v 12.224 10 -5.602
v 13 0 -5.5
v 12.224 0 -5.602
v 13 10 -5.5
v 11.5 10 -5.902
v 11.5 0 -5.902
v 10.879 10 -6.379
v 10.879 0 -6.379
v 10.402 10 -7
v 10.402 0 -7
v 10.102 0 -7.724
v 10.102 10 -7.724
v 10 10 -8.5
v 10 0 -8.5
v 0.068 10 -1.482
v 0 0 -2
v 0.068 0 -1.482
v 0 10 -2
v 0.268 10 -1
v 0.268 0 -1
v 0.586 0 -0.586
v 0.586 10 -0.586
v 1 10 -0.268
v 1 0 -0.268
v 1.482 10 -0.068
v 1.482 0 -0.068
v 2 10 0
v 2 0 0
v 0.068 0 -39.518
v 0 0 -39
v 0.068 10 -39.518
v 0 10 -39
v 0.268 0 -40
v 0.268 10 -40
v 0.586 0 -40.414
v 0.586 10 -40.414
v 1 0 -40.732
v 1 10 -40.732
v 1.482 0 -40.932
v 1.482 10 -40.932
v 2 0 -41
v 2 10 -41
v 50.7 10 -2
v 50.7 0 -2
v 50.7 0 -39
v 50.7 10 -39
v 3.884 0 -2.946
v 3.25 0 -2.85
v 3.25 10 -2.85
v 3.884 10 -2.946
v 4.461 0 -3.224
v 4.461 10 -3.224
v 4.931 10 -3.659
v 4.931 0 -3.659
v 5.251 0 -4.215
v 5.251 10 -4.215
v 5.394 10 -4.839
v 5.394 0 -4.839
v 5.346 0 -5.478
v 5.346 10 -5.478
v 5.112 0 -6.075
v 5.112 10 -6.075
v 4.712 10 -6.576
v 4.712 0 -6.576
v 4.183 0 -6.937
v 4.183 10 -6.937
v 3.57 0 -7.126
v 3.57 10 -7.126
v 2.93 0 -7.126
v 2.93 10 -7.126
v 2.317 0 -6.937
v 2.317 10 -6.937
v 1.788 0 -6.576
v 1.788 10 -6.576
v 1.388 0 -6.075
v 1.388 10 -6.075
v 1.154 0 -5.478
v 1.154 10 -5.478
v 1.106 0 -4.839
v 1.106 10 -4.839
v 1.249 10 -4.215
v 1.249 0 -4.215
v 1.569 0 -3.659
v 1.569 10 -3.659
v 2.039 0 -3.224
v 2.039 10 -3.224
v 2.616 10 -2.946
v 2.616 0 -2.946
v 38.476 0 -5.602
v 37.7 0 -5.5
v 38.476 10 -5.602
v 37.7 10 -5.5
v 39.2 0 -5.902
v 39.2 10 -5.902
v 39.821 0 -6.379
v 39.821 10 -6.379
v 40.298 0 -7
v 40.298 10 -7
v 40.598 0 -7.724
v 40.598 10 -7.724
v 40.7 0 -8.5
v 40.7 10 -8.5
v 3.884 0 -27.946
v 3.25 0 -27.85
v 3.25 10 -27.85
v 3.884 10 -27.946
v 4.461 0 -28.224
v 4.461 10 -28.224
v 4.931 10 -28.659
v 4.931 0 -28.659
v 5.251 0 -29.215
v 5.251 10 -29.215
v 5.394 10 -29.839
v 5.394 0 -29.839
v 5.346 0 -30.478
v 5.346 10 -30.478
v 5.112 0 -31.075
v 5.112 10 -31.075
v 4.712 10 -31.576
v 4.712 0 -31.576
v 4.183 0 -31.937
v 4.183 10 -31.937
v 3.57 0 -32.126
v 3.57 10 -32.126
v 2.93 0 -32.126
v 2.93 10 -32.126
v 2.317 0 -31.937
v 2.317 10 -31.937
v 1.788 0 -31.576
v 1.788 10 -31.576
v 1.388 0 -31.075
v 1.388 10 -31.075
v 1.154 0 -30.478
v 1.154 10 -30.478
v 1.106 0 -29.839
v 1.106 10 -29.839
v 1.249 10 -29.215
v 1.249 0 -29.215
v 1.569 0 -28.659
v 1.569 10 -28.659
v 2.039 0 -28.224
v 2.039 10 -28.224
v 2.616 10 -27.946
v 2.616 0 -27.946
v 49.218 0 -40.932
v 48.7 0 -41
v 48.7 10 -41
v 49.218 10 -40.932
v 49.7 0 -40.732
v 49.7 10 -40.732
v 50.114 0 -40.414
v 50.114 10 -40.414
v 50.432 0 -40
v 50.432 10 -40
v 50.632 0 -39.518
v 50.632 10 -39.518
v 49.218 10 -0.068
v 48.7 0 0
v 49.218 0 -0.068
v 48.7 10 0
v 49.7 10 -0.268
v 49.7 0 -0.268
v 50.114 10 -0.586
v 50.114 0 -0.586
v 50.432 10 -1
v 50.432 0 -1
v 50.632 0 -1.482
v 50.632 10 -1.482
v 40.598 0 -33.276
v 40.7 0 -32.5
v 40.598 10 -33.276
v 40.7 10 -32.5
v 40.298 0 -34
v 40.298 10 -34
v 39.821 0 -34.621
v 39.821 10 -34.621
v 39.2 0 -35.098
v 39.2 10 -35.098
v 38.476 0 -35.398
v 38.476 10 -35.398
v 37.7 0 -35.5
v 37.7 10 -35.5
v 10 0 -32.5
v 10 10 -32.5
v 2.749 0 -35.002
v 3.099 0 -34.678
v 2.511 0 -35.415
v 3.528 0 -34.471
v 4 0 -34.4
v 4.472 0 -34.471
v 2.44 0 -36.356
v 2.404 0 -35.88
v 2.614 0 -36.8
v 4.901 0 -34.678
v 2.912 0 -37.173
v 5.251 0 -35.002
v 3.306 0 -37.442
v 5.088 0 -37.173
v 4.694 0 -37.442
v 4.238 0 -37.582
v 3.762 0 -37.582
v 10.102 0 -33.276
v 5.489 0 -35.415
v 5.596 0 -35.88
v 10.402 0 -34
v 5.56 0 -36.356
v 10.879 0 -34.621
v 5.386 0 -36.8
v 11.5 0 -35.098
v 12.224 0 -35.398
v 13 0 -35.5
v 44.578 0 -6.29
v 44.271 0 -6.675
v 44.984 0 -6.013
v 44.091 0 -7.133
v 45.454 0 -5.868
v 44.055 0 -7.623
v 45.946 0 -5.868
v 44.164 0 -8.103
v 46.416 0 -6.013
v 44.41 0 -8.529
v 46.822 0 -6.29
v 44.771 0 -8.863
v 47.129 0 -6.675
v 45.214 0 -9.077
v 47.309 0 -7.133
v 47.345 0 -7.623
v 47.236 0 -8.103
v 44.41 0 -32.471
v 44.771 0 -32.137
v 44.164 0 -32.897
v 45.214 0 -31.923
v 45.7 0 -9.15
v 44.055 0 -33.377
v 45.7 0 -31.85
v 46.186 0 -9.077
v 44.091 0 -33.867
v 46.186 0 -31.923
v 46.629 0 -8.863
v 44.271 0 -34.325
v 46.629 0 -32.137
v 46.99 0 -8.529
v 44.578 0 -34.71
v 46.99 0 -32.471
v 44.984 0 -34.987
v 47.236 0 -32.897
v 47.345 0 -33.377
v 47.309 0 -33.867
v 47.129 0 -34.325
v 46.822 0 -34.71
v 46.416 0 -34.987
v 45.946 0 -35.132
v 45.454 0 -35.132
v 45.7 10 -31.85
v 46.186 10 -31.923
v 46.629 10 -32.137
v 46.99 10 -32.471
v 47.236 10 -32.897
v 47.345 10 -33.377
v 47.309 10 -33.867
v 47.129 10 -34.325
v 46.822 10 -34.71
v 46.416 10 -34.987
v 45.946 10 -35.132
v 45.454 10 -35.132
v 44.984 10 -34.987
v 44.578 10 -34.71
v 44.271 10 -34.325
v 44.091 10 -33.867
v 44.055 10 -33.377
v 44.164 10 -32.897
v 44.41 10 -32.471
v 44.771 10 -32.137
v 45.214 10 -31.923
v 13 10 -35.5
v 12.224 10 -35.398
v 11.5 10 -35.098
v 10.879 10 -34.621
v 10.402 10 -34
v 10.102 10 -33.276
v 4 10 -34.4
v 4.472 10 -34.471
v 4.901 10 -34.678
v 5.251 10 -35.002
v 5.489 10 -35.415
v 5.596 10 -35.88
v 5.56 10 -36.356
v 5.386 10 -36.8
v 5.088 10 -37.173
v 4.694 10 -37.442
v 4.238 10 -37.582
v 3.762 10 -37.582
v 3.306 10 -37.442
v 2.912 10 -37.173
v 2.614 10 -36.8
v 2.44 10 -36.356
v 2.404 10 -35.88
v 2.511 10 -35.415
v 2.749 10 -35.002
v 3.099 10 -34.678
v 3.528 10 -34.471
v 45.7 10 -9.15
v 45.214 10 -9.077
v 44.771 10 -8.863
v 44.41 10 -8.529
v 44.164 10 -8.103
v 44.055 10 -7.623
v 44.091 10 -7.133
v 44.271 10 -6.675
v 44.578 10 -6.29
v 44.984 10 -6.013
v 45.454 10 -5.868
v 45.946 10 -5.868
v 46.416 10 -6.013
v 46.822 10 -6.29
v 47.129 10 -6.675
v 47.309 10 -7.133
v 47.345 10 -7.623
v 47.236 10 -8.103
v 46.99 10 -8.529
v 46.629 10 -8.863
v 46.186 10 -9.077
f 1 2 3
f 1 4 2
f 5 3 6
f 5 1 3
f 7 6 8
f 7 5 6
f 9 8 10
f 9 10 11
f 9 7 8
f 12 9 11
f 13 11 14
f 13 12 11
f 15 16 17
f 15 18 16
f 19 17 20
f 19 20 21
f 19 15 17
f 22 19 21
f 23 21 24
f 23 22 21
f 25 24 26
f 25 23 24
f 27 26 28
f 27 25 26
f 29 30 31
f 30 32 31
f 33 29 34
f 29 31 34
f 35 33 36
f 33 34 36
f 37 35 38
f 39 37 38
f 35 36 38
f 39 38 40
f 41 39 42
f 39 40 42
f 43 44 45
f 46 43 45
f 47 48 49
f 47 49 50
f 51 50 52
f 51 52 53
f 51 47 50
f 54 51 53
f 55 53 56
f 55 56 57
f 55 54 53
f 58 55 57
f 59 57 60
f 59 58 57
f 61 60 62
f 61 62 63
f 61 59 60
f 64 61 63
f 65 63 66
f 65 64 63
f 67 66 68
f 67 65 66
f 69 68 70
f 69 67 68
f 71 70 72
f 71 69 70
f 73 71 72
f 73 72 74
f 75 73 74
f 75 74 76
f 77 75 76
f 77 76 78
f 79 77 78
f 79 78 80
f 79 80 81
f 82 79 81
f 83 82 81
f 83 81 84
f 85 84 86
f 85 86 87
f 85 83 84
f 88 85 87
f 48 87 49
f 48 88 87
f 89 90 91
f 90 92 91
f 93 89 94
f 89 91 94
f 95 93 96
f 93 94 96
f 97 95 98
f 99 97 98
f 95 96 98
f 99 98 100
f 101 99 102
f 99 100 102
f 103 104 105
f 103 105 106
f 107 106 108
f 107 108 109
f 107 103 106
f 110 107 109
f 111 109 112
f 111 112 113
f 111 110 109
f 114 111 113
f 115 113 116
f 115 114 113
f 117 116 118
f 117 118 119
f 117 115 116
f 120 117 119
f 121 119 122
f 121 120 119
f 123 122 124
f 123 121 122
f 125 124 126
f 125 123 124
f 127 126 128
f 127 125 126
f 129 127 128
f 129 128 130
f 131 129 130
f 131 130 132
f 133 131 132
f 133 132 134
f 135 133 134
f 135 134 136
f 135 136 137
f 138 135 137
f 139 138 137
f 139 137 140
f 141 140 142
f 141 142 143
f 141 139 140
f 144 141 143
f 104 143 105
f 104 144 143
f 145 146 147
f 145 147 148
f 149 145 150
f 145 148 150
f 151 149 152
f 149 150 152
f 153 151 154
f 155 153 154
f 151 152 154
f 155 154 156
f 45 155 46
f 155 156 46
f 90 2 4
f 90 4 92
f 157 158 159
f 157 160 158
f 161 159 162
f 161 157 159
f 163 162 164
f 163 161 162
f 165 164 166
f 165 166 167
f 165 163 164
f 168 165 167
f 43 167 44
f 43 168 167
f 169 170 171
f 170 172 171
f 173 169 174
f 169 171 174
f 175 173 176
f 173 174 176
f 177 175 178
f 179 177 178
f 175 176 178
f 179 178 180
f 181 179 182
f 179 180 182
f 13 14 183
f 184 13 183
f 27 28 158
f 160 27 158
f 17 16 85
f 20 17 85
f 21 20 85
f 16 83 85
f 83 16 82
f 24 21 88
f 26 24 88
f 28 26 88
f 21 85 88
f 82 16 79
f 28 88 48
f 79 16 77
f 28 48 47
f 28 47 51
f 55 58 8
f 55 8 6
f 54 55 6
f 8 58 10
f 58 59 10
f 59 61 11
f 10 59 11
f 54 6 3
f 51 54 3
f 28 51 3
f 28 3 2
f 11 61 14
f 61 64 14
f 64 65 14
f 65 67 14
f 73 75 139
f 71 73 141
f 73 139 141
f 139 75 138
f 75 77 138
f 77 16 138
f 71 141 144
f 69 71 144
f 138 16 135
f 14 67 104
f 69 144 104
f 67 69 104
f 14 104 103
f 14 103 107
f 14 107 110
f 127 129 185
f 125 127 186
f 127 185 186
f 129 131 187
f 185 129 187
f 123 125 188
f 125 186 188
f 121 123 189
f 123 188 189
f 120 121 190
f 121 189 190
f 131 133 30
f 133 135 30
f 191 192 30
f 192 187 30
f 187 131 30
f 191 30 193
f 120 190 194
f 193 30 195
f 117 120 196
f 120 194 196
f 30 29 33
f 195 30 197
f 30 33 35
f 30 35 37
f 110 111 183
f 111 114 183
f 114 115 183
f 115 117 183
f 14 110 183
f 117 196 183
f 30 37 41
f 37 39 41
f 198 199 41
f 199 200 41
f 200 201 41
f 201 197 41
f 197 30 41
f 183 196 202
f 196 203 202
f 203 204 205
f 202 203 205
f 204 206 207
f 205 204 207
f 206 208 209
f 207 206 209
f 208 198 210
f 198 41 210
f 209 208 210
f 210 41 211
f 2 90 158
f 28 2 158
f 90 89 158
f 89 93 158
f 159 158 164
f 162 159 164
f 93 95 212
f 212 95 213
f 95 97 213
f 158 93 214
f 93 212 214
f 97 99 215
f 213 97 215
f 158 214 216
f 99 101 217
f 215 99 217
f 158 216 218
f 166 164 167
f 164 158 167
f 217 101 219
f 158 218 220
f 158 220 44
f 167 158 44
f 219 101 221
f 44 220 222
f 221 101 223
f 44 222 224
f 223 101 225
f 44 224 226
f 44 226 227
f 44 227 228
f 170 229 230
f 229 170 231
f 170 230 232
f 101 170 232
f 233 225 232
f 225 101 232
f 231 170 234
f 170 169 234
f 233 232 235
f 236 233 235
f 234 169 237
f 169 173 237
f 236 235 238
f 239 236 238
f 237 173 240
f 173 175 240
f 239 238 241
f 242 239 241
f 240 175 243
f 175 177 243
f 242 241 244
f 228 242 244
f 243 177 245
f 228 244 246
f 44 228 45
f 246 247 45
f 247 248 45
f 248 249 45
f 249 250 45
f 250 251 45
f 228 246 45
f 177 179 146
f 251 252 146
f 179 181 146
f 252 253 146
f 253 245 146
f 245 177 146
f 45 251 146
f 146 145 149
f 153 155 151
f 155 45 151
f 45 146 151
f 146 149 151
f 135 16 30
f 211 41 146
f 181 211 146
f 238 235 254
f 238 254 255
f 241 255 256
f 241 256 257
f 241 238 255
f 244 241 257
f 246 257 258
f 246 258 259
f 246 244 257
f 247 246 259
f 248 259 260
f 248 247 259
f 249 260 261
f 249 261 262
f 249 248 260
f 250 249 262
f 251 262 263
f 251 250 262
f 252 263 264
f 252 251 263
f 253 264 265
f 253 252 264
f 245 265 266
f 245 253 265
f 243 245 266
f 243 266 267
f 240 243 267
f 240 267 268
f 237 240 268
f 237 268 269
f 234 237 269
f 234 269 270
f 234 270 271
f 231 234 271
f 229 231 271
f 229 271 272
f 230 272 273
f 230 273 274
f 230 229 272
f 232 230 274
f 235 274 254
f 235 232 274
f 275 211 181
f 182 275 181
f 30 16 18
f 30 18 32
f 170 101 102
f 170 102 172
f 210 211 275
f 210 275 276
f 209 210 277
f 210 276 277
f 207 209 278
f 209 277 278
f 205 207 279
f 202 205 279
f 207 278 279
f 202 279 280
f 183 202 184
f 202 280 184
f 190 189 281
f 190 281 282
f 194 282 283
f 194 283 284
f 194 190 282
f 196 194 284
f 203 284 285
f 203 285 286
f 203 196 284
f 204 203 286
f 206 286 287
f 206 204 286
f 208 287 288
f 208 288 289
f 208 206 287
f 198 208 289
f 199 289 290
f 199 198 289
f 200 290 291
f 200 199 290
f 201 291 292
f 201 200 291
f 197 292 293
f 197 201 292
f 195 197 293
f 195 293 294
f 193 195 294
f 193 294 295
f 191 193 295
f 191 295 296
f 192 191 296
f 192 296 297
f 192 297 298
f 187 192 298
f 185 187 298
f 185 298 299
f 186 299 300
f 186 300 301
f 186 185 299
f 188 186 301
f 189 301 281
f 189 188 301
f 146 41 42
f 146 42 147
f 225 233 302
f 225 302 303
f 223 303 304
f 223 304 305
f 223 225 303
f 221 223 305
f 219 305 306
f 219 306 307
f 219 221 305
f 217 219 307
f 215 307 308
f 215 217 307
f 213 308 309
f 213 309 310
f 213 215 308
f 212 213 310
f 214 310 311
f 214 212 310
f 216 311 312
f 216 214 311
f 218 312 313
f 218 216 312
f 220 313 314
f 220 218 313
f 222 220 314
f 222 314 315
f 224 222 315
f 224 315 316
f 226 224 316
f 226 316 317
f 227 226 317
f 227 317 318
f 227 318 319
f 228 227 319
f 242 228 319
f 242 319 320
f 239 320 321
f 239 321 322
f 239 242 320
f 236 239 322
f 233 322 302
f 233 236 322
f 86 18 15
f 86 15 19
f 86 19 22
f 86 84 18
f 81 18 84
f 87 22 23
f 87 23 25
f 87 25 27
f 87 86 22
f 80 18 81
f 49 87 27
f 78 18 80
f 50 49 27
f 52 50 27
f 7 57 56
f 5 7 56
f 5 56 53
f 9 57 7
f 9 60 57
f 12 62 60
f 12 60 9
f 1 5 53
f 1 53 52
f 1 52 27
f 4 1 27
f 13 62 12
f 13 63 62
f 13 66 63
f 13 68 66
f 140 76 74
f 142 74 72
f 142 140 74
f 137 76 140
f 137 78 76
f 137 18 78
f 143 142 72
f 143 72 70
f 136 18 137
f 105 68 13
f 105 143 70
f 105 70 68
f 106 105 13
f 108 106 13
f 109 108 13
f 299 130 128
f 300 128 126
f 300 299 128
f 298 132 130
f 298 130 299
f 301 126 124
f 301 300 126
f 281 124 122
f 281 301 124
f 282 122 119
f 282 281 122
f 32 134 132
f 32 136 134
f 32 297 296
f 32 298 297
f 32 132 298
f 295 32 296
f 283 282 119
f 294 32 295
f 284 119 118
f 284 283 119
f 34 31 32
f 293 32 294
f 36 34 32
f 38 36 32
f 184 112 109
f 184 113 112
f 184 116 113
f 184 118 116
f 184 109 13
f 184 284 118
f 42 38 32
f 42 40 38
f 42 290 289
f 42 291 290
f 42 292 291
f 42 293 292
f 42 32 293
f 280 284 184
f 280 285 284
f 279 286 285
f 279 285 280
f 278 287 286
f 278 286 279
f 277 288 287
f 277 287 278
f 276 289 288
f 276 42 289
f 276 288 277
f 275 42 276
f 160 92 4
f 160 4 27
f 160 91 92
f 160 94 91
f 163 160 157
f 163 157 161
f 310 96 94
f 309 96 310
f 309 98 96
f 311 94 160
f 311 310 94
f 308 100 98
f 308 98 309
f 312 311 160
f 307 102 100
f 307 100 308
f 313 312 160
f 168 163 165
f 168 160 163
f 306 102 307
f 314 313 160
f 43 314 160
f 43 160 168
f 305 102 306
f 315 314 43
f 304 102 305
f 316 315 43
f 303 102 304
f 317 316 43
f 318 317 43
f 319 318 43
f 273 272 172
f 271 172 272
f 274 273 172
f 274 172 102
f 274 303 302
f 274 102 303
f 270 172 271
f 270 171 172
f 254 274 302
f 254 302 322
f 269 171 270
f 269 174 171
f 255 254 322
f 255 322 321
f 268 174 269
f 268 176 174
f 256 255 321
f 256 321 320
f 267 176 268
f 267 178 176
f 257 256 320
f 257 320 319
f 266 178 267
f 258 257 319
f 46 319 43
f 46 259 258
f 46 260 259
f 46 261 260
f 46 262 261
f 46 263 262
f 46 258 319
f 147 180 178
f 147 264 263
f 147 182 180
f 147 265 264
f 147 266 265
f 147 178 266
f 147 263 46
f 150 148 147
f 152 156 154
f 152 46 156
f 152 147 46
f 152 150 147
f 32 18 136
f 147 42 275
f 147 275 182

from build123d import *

# Parameters (mm, degrees)
SKETCH_2_W      = 50.7
SKETCH_2_H      = 41
SKETCH_2_R      = 1.6
SKETCH_2_R_2    = 2.15
SKETCH_2_R_3    = 1.65
SKETCH_2_W_2    = 30.7
SKETCH_2_H_2    = 30
EXTRUDE_1_DEPTH = 10
FILLET_1_R      = 2
FILLET_2_R      = 3


with BuildPart() as part:
    # ｽｹｯﾁ2 → ﾎﾞｽ - 押し出し1 (new body)
    with BuildSketch(Plane(origin=(0, 0, 0), x_dir=(1, 0, 0), z_dir=(0, 1, 0))):
        with Locations((25.35, 20.5)):
            Rectangle(SKETCH_2_W, SKETCH_2_H)
        with Locations(Location((4, 36, 0), (0, 0, 270))):
            Circle(SKETCH_2_R, mode=Mode.SUBTRACT)
        with Locations(Location((3.25, 30, 0), (0, 0, 270))):
            Circle(SKETCH_2_R_2, mode=Mode.SUBTRACT)
        with Locations(Location((3.25, 5, 0), (0, 0, 270))):
            Circle(SKETCH_2_R_2, mode=Mode.SUBTRACT)
        with Locations(Location((45.7, 33.5, 0), (0, 0, 270))):
            Circle(SKETCH_2_R_3, mode=Mode.SUBTRACT)
        with Locations(Location((45.7, 7.5, 0), (0, 0, 90))):
            Circle(SKETCH_2_R_3, mode=Mode.SUBTRACT)
        with Locations((25.35, 20.5)):
            Rectangle(SKETCH_2_W_2, SKETCH_2_H_2, mode=Mode.SUBTRACT)
    extrude(amount=EXTRUDE_1_DEPTH)

    # ﾌｨﾚｯﾄ1
    fillet_1_edges = [part.edges().sort_by_distance(p)[0] for p in [
        (0, 5, -41),
        (50.7, 5, -41),
        (50.7, 5, 0),
        (0, 5, 0),
    ]]
    fillet(fillet_1_edges, radius=FILLET_1_R)

    # ﾌｨﾚｯﾄ2
    fillet_2_edges = [part.edges().sort_by_distance(p)[0] for p in [
        (40.7, 5, -5.5),
        (40.7, 5, -35.5),
        (10, 5, -35.5),
        (10, 5, -5.5),
    ]]
    fillet(fillet_2_edges, radius=FILLET_2_R)


solid = part.part
